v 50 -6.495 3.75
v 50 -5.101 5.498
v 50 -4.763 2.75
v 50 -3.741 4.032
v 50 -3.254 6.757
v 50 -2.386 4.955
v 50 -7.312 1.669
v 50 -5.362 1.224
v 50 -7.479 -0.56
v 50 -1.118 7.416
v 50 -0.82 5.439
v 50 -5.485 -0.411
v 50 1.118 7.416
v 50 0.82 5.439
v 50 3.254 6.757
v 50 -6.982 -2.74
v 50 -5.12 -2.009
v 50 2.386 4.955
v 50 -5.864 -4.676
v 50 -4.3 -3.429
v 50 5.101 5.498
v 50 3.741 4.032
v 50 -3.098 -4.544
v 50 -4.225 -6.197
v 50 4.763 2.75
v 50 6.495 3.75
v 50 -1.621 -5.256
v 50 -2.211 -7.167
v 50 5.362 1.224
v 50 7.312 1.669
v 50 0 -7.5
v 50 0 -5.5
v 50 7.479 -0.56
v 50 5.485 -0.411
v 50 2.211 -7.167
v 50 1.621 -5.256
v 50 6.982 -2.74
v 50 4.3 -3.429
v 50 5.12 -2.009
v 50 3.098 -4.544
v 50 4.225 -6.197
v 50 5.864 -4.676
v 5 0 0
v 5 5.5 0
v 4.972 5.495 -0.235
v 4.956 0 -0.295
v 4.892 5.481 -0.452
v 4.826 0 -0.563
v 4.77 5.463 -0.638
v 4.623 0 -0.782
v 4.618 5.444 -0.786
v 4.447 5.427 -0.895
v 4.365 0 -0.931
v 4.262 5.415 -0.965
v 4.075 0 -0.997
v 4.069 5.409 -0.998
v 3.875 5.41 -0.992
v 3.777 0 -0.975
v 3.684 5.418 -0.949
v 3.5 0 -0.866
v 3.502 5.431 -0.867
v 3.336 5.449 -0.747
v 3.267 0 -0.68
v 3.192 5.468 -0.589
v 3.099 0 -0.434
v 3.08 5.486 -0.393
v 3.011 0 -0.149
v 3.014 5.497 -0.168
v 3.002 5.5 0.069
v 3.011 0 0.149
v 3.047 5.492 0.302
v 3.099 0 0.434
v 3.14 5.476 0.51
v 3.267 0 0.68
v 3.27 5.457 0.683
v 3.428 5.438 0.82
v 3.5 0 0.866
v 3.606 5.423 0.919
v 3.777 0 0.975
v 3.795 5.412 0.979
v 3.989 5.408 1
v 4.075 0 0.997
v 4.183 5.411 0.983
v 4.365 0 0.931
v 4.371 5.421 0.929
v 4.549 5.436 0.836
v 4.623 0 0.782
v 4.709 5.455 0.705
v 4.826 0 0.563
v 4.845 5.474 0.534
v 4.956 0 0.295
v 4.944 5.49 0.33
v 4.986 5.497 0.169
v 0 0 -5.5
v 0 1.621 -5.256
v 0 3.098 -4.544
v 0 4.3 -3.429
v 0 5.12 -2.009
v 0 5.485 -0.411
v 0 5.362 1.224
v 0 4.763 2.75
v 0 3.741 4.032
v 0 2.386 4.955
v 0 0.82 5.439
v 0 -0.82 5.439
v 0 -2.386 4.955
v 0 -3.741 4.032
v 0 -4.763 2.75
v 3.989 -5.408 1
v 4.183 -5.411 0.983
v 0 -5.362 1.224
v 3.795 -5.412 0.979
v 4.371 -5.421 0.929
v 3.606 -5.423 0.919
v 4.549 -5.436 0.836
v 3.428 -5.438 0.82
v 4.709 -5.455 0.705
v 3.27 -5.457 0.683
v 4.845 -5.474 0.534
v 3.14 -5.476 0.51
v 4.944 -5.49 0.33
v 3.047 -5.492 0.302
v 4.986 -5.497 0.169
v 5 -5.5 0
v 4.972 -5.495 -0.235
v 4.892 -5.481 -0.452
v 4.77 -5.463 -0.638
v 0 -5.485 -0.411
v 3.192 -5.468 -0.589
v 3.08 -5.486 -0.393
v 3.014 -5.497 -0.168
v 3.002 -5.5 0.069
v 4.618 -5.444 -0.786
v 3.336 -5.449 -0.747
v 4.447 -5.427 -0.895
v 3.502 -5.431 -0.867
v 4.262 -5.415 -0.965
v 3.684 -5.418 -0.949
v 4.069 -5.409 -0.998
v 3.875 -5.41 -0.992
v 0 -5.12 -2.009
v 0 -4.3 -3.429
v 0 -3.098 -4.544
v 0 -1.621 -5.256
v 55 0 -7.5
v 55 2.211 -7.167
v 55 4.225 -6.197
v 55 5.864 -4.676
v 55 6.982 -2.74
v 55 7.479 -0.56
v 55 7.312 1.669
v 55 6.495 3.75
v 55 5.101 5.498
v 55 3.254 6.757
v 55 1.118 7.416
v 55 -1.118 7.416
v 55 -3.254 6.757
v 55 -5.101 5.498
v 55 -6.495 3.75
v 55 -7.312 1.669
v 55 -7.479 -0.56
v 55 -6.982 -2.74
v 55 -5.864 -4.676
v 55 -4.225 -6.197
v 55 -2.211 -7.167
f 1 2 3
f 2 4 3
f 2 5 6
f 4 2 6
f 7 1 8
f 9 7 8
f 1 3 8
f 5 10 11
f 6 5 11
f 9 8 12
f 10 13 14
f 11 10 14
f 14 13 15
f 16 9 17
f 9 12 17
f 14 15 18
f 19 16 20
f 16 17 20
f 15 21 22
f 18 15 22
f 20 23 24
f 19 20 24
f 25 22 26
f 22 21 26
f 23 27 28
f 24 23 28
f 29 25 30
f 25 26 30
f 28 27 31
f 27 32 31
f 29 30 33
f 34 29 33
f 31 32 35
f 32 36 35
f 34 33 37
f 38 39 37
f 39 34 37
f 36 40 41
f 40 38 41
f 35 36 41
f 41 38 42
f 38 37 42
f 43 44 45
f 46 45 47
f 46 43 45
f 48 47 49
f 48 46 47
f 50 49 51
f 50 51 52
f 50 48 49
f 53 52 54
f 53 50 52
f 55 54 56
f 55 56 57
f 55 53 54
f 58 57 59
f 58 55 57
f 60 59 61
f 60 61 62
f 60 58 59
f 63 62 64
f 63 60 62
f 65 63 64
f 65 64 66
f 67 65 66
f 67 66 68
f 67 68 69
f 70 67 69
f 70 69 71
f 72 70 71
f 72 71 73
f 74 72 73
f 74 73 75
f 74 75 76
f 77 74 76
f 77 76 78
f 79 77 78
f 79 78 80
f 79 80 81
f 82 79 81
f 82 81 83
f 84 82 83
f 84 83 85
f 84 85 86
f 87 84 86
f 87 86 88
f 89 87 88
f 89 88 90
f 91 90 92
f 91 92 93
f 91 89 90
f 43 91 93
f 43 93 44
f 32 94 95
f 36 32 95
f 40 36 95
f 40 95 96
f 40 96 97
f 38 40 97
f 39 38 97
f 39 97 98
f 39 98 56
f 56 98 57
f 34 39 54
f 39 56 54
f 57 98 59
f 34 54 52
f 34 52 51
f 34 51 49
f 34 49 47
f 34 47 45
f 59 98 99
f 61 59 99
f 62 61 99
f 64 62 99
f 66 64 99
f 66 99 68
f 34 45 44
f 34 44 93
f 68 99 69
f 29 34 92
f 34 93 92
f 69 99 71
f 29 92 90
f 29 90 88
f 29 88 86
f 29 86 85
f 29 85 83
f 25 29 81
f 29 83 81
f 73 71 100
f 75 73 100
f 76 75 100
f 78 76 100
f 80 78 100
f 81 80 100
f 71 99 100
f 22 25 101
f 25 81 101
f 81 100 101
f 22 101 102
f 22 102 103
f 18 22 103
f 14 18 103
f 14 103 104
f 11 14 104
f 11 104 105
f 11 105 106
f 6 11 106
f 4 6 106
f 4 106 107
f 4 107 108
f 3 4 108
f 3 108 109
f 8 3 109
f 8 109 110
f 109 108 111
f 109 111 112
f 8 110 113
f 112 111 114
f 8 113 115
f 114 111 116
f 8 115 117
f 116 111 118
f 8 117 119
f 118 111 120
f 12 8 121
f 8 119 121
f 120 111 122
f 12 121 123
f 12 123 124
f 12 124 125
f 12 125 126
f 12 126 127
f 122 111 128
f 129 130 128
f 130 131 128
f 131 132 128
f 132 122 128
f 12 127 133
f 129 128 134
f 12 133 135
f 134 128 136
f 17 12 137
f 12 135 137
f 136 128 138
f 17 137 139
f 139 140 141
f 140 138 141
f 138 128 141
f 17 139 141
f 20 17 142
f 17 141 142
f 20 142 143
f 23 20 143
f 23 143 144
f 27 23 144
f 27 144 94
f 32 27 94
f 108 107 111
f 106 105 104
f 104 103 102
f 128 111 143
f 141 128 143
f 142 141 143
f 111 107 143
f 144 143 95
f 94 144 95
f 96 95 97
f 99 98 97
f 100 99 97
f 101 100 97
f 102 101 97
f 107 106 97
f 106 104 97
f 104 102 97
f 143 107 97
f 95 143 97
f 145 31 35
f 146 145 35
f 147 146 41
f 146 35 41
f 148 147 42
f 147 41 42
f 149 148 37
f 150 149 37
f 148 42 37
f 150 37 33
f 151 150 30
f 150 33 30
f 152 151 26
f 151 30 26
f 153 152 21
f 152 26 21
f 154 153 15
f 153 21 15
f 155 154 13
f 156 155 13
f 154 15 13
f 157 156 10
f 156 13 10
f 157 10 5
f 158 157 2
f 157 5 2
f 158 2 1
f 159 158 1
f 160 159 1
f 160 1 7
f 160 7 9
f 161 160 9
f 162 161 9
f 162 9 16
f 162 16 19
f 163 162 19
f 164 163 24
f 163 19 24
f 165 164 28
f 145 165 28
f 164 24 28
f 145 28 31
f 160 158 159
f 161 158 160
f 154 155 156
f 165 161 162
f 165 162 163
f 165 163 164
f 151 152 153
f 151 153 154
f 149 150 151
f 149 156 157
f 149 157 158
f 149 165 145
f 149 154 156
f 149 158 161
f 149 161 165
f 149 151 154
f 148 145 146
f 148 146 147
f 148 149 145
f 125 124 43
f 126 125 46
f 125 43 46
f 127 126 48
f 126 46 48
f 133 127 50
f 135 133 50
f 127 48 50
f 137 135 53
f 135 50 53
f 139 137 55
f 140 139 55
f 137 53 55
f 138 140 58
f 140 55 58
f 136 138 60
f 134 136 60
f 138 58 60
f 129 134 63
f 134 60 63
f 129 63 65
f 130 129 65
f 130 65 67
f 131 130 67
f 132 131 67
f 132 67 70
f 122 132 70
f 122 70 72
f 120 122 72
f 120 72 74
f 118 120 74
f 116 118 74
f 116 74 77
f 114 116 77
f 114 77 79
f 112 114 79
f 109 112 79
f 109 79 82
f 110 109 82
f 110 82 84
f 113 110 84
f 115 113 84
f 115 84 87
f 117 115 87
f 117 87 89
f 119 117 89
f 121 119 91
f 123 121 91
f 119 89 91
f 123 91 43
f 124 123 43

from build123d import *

# Parameters (mm, degrees)
SKETCH1_R               = 5.5
BOSS_EXTRUDE1_DEPTH     = 50
SKETCH2_R               = 7.5
BOSS_EXTRUDE2_DEPTH     = 5
SKETCH3_R               = 1
CUT_EXTRUDE1_DEPTH      = 8.5
CUT_EXTRUDE1_DEPTH_BACK = 8.5


with BuildPart() as part:
    # Sketch1 → Boss-Extrude1 (new body)
    with BuildSketch(Plane(origin=(0, 0, 0), x_dir=(0, 0, -1), z_dir=(1, 0, 0))):
        Circle(SKETCH1_R)
    extrude(amount=BOSS_EXTRUDE1_DEPTH)

    # Sketch2 → Boss-Extrude2 (add)
    with BuildSketch(Plane(origin=(50, 0, 0), x_dir=(0, 0, -1), z_dir=(1, 0, 0))):
        Circle(SKETCH2_R)
    extrude(amount=BOSS_EXTRUDE2_DEPTH)

    # Sketch3 → Cut-Extrude1 (cut, two sides)
    with BuildSketch(Plane(origin=(0, 0, 0), x_dir=(1, 0, 0), z_dir=(0, 1, 0))) as cut_extrude1_sk:
        with Locations((4, 0)):
            Circle(SKETCH3_R)
    extrude(amount=CUT_EXTRUDE1_DEPTH, mode=Mode.SUBTRACT)
    extrude(cut_extrude1_sk.sketch, amount=-CUT_EXTRUDE1_DEPTH_BACK, mode=Mode.SUBTRACT)


solid = part.part
